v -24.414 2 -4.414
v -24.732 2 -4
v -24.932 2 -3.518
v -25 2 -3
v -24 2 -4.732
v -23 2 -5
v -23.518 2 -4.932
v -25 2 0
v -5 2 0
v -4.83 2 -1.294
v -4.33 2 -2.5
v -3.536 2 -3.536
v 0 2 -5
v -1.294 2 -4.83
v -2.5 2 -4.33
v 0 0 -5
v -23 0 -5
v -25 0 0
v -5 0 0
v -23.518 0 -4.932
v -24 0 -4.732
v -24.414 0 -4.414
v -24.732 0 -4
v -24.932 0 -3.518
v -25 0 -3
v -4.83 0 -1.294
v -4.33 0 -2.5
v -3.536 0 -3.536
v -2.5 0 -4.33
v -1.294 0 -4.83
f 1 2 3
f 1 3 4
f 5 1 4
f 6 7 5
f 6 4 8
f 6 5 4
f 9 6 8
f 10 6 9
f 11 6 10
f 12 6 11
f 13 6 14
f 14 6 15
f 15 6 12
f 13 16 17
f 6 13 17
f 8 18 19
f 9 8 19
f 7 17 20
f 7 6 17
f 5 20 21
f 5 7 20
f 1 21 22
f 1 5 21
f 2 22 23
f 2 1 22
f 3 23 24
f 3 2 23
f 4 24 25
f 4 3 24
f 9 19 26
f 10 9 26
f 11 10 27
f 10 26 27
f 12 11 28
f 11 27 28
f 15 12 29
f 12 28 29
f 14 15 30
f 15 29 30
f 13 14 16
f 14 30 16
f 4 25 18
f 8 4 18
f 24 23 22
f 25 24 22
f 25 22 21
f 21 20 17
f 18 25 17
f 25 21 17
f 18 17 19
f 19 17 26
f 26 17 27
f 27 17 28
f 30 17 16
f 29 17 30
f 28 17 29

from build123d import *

# Parameters (mm, degrees)
BOSS_EXTRUDE1_DEPTH = 2
FILLET1_R           = 2


with BuildPart() as part:
    # Sketch1 → Boss-Extrude1 (new body)
    with BuildSketch(Plane(origin=(0, 0, 0), x_dir=(1, 0, 0), z_dir=(0, 1, 0))):
        with BuildLine():
            Line((0, 5), (-25, 5))
            Line((-25, 5), (-25, 0))
            Line((-25, 0), (-5, 0))
            ThreePointArc((-5, 0), (-3.535533906, 3.535533906), (0, 5))
        make_face()
    extrude(amount=BOSS_EXTRUDE1_DEPTH)

    # Fillet1
    fillet1_edges = [part.edges().sort_by_distance(p)[0] for p in [
        (-25, 1, -5),
    ]]
    fillet(fillet1_edges, radius=FILLET1_R)


solid = part.part
